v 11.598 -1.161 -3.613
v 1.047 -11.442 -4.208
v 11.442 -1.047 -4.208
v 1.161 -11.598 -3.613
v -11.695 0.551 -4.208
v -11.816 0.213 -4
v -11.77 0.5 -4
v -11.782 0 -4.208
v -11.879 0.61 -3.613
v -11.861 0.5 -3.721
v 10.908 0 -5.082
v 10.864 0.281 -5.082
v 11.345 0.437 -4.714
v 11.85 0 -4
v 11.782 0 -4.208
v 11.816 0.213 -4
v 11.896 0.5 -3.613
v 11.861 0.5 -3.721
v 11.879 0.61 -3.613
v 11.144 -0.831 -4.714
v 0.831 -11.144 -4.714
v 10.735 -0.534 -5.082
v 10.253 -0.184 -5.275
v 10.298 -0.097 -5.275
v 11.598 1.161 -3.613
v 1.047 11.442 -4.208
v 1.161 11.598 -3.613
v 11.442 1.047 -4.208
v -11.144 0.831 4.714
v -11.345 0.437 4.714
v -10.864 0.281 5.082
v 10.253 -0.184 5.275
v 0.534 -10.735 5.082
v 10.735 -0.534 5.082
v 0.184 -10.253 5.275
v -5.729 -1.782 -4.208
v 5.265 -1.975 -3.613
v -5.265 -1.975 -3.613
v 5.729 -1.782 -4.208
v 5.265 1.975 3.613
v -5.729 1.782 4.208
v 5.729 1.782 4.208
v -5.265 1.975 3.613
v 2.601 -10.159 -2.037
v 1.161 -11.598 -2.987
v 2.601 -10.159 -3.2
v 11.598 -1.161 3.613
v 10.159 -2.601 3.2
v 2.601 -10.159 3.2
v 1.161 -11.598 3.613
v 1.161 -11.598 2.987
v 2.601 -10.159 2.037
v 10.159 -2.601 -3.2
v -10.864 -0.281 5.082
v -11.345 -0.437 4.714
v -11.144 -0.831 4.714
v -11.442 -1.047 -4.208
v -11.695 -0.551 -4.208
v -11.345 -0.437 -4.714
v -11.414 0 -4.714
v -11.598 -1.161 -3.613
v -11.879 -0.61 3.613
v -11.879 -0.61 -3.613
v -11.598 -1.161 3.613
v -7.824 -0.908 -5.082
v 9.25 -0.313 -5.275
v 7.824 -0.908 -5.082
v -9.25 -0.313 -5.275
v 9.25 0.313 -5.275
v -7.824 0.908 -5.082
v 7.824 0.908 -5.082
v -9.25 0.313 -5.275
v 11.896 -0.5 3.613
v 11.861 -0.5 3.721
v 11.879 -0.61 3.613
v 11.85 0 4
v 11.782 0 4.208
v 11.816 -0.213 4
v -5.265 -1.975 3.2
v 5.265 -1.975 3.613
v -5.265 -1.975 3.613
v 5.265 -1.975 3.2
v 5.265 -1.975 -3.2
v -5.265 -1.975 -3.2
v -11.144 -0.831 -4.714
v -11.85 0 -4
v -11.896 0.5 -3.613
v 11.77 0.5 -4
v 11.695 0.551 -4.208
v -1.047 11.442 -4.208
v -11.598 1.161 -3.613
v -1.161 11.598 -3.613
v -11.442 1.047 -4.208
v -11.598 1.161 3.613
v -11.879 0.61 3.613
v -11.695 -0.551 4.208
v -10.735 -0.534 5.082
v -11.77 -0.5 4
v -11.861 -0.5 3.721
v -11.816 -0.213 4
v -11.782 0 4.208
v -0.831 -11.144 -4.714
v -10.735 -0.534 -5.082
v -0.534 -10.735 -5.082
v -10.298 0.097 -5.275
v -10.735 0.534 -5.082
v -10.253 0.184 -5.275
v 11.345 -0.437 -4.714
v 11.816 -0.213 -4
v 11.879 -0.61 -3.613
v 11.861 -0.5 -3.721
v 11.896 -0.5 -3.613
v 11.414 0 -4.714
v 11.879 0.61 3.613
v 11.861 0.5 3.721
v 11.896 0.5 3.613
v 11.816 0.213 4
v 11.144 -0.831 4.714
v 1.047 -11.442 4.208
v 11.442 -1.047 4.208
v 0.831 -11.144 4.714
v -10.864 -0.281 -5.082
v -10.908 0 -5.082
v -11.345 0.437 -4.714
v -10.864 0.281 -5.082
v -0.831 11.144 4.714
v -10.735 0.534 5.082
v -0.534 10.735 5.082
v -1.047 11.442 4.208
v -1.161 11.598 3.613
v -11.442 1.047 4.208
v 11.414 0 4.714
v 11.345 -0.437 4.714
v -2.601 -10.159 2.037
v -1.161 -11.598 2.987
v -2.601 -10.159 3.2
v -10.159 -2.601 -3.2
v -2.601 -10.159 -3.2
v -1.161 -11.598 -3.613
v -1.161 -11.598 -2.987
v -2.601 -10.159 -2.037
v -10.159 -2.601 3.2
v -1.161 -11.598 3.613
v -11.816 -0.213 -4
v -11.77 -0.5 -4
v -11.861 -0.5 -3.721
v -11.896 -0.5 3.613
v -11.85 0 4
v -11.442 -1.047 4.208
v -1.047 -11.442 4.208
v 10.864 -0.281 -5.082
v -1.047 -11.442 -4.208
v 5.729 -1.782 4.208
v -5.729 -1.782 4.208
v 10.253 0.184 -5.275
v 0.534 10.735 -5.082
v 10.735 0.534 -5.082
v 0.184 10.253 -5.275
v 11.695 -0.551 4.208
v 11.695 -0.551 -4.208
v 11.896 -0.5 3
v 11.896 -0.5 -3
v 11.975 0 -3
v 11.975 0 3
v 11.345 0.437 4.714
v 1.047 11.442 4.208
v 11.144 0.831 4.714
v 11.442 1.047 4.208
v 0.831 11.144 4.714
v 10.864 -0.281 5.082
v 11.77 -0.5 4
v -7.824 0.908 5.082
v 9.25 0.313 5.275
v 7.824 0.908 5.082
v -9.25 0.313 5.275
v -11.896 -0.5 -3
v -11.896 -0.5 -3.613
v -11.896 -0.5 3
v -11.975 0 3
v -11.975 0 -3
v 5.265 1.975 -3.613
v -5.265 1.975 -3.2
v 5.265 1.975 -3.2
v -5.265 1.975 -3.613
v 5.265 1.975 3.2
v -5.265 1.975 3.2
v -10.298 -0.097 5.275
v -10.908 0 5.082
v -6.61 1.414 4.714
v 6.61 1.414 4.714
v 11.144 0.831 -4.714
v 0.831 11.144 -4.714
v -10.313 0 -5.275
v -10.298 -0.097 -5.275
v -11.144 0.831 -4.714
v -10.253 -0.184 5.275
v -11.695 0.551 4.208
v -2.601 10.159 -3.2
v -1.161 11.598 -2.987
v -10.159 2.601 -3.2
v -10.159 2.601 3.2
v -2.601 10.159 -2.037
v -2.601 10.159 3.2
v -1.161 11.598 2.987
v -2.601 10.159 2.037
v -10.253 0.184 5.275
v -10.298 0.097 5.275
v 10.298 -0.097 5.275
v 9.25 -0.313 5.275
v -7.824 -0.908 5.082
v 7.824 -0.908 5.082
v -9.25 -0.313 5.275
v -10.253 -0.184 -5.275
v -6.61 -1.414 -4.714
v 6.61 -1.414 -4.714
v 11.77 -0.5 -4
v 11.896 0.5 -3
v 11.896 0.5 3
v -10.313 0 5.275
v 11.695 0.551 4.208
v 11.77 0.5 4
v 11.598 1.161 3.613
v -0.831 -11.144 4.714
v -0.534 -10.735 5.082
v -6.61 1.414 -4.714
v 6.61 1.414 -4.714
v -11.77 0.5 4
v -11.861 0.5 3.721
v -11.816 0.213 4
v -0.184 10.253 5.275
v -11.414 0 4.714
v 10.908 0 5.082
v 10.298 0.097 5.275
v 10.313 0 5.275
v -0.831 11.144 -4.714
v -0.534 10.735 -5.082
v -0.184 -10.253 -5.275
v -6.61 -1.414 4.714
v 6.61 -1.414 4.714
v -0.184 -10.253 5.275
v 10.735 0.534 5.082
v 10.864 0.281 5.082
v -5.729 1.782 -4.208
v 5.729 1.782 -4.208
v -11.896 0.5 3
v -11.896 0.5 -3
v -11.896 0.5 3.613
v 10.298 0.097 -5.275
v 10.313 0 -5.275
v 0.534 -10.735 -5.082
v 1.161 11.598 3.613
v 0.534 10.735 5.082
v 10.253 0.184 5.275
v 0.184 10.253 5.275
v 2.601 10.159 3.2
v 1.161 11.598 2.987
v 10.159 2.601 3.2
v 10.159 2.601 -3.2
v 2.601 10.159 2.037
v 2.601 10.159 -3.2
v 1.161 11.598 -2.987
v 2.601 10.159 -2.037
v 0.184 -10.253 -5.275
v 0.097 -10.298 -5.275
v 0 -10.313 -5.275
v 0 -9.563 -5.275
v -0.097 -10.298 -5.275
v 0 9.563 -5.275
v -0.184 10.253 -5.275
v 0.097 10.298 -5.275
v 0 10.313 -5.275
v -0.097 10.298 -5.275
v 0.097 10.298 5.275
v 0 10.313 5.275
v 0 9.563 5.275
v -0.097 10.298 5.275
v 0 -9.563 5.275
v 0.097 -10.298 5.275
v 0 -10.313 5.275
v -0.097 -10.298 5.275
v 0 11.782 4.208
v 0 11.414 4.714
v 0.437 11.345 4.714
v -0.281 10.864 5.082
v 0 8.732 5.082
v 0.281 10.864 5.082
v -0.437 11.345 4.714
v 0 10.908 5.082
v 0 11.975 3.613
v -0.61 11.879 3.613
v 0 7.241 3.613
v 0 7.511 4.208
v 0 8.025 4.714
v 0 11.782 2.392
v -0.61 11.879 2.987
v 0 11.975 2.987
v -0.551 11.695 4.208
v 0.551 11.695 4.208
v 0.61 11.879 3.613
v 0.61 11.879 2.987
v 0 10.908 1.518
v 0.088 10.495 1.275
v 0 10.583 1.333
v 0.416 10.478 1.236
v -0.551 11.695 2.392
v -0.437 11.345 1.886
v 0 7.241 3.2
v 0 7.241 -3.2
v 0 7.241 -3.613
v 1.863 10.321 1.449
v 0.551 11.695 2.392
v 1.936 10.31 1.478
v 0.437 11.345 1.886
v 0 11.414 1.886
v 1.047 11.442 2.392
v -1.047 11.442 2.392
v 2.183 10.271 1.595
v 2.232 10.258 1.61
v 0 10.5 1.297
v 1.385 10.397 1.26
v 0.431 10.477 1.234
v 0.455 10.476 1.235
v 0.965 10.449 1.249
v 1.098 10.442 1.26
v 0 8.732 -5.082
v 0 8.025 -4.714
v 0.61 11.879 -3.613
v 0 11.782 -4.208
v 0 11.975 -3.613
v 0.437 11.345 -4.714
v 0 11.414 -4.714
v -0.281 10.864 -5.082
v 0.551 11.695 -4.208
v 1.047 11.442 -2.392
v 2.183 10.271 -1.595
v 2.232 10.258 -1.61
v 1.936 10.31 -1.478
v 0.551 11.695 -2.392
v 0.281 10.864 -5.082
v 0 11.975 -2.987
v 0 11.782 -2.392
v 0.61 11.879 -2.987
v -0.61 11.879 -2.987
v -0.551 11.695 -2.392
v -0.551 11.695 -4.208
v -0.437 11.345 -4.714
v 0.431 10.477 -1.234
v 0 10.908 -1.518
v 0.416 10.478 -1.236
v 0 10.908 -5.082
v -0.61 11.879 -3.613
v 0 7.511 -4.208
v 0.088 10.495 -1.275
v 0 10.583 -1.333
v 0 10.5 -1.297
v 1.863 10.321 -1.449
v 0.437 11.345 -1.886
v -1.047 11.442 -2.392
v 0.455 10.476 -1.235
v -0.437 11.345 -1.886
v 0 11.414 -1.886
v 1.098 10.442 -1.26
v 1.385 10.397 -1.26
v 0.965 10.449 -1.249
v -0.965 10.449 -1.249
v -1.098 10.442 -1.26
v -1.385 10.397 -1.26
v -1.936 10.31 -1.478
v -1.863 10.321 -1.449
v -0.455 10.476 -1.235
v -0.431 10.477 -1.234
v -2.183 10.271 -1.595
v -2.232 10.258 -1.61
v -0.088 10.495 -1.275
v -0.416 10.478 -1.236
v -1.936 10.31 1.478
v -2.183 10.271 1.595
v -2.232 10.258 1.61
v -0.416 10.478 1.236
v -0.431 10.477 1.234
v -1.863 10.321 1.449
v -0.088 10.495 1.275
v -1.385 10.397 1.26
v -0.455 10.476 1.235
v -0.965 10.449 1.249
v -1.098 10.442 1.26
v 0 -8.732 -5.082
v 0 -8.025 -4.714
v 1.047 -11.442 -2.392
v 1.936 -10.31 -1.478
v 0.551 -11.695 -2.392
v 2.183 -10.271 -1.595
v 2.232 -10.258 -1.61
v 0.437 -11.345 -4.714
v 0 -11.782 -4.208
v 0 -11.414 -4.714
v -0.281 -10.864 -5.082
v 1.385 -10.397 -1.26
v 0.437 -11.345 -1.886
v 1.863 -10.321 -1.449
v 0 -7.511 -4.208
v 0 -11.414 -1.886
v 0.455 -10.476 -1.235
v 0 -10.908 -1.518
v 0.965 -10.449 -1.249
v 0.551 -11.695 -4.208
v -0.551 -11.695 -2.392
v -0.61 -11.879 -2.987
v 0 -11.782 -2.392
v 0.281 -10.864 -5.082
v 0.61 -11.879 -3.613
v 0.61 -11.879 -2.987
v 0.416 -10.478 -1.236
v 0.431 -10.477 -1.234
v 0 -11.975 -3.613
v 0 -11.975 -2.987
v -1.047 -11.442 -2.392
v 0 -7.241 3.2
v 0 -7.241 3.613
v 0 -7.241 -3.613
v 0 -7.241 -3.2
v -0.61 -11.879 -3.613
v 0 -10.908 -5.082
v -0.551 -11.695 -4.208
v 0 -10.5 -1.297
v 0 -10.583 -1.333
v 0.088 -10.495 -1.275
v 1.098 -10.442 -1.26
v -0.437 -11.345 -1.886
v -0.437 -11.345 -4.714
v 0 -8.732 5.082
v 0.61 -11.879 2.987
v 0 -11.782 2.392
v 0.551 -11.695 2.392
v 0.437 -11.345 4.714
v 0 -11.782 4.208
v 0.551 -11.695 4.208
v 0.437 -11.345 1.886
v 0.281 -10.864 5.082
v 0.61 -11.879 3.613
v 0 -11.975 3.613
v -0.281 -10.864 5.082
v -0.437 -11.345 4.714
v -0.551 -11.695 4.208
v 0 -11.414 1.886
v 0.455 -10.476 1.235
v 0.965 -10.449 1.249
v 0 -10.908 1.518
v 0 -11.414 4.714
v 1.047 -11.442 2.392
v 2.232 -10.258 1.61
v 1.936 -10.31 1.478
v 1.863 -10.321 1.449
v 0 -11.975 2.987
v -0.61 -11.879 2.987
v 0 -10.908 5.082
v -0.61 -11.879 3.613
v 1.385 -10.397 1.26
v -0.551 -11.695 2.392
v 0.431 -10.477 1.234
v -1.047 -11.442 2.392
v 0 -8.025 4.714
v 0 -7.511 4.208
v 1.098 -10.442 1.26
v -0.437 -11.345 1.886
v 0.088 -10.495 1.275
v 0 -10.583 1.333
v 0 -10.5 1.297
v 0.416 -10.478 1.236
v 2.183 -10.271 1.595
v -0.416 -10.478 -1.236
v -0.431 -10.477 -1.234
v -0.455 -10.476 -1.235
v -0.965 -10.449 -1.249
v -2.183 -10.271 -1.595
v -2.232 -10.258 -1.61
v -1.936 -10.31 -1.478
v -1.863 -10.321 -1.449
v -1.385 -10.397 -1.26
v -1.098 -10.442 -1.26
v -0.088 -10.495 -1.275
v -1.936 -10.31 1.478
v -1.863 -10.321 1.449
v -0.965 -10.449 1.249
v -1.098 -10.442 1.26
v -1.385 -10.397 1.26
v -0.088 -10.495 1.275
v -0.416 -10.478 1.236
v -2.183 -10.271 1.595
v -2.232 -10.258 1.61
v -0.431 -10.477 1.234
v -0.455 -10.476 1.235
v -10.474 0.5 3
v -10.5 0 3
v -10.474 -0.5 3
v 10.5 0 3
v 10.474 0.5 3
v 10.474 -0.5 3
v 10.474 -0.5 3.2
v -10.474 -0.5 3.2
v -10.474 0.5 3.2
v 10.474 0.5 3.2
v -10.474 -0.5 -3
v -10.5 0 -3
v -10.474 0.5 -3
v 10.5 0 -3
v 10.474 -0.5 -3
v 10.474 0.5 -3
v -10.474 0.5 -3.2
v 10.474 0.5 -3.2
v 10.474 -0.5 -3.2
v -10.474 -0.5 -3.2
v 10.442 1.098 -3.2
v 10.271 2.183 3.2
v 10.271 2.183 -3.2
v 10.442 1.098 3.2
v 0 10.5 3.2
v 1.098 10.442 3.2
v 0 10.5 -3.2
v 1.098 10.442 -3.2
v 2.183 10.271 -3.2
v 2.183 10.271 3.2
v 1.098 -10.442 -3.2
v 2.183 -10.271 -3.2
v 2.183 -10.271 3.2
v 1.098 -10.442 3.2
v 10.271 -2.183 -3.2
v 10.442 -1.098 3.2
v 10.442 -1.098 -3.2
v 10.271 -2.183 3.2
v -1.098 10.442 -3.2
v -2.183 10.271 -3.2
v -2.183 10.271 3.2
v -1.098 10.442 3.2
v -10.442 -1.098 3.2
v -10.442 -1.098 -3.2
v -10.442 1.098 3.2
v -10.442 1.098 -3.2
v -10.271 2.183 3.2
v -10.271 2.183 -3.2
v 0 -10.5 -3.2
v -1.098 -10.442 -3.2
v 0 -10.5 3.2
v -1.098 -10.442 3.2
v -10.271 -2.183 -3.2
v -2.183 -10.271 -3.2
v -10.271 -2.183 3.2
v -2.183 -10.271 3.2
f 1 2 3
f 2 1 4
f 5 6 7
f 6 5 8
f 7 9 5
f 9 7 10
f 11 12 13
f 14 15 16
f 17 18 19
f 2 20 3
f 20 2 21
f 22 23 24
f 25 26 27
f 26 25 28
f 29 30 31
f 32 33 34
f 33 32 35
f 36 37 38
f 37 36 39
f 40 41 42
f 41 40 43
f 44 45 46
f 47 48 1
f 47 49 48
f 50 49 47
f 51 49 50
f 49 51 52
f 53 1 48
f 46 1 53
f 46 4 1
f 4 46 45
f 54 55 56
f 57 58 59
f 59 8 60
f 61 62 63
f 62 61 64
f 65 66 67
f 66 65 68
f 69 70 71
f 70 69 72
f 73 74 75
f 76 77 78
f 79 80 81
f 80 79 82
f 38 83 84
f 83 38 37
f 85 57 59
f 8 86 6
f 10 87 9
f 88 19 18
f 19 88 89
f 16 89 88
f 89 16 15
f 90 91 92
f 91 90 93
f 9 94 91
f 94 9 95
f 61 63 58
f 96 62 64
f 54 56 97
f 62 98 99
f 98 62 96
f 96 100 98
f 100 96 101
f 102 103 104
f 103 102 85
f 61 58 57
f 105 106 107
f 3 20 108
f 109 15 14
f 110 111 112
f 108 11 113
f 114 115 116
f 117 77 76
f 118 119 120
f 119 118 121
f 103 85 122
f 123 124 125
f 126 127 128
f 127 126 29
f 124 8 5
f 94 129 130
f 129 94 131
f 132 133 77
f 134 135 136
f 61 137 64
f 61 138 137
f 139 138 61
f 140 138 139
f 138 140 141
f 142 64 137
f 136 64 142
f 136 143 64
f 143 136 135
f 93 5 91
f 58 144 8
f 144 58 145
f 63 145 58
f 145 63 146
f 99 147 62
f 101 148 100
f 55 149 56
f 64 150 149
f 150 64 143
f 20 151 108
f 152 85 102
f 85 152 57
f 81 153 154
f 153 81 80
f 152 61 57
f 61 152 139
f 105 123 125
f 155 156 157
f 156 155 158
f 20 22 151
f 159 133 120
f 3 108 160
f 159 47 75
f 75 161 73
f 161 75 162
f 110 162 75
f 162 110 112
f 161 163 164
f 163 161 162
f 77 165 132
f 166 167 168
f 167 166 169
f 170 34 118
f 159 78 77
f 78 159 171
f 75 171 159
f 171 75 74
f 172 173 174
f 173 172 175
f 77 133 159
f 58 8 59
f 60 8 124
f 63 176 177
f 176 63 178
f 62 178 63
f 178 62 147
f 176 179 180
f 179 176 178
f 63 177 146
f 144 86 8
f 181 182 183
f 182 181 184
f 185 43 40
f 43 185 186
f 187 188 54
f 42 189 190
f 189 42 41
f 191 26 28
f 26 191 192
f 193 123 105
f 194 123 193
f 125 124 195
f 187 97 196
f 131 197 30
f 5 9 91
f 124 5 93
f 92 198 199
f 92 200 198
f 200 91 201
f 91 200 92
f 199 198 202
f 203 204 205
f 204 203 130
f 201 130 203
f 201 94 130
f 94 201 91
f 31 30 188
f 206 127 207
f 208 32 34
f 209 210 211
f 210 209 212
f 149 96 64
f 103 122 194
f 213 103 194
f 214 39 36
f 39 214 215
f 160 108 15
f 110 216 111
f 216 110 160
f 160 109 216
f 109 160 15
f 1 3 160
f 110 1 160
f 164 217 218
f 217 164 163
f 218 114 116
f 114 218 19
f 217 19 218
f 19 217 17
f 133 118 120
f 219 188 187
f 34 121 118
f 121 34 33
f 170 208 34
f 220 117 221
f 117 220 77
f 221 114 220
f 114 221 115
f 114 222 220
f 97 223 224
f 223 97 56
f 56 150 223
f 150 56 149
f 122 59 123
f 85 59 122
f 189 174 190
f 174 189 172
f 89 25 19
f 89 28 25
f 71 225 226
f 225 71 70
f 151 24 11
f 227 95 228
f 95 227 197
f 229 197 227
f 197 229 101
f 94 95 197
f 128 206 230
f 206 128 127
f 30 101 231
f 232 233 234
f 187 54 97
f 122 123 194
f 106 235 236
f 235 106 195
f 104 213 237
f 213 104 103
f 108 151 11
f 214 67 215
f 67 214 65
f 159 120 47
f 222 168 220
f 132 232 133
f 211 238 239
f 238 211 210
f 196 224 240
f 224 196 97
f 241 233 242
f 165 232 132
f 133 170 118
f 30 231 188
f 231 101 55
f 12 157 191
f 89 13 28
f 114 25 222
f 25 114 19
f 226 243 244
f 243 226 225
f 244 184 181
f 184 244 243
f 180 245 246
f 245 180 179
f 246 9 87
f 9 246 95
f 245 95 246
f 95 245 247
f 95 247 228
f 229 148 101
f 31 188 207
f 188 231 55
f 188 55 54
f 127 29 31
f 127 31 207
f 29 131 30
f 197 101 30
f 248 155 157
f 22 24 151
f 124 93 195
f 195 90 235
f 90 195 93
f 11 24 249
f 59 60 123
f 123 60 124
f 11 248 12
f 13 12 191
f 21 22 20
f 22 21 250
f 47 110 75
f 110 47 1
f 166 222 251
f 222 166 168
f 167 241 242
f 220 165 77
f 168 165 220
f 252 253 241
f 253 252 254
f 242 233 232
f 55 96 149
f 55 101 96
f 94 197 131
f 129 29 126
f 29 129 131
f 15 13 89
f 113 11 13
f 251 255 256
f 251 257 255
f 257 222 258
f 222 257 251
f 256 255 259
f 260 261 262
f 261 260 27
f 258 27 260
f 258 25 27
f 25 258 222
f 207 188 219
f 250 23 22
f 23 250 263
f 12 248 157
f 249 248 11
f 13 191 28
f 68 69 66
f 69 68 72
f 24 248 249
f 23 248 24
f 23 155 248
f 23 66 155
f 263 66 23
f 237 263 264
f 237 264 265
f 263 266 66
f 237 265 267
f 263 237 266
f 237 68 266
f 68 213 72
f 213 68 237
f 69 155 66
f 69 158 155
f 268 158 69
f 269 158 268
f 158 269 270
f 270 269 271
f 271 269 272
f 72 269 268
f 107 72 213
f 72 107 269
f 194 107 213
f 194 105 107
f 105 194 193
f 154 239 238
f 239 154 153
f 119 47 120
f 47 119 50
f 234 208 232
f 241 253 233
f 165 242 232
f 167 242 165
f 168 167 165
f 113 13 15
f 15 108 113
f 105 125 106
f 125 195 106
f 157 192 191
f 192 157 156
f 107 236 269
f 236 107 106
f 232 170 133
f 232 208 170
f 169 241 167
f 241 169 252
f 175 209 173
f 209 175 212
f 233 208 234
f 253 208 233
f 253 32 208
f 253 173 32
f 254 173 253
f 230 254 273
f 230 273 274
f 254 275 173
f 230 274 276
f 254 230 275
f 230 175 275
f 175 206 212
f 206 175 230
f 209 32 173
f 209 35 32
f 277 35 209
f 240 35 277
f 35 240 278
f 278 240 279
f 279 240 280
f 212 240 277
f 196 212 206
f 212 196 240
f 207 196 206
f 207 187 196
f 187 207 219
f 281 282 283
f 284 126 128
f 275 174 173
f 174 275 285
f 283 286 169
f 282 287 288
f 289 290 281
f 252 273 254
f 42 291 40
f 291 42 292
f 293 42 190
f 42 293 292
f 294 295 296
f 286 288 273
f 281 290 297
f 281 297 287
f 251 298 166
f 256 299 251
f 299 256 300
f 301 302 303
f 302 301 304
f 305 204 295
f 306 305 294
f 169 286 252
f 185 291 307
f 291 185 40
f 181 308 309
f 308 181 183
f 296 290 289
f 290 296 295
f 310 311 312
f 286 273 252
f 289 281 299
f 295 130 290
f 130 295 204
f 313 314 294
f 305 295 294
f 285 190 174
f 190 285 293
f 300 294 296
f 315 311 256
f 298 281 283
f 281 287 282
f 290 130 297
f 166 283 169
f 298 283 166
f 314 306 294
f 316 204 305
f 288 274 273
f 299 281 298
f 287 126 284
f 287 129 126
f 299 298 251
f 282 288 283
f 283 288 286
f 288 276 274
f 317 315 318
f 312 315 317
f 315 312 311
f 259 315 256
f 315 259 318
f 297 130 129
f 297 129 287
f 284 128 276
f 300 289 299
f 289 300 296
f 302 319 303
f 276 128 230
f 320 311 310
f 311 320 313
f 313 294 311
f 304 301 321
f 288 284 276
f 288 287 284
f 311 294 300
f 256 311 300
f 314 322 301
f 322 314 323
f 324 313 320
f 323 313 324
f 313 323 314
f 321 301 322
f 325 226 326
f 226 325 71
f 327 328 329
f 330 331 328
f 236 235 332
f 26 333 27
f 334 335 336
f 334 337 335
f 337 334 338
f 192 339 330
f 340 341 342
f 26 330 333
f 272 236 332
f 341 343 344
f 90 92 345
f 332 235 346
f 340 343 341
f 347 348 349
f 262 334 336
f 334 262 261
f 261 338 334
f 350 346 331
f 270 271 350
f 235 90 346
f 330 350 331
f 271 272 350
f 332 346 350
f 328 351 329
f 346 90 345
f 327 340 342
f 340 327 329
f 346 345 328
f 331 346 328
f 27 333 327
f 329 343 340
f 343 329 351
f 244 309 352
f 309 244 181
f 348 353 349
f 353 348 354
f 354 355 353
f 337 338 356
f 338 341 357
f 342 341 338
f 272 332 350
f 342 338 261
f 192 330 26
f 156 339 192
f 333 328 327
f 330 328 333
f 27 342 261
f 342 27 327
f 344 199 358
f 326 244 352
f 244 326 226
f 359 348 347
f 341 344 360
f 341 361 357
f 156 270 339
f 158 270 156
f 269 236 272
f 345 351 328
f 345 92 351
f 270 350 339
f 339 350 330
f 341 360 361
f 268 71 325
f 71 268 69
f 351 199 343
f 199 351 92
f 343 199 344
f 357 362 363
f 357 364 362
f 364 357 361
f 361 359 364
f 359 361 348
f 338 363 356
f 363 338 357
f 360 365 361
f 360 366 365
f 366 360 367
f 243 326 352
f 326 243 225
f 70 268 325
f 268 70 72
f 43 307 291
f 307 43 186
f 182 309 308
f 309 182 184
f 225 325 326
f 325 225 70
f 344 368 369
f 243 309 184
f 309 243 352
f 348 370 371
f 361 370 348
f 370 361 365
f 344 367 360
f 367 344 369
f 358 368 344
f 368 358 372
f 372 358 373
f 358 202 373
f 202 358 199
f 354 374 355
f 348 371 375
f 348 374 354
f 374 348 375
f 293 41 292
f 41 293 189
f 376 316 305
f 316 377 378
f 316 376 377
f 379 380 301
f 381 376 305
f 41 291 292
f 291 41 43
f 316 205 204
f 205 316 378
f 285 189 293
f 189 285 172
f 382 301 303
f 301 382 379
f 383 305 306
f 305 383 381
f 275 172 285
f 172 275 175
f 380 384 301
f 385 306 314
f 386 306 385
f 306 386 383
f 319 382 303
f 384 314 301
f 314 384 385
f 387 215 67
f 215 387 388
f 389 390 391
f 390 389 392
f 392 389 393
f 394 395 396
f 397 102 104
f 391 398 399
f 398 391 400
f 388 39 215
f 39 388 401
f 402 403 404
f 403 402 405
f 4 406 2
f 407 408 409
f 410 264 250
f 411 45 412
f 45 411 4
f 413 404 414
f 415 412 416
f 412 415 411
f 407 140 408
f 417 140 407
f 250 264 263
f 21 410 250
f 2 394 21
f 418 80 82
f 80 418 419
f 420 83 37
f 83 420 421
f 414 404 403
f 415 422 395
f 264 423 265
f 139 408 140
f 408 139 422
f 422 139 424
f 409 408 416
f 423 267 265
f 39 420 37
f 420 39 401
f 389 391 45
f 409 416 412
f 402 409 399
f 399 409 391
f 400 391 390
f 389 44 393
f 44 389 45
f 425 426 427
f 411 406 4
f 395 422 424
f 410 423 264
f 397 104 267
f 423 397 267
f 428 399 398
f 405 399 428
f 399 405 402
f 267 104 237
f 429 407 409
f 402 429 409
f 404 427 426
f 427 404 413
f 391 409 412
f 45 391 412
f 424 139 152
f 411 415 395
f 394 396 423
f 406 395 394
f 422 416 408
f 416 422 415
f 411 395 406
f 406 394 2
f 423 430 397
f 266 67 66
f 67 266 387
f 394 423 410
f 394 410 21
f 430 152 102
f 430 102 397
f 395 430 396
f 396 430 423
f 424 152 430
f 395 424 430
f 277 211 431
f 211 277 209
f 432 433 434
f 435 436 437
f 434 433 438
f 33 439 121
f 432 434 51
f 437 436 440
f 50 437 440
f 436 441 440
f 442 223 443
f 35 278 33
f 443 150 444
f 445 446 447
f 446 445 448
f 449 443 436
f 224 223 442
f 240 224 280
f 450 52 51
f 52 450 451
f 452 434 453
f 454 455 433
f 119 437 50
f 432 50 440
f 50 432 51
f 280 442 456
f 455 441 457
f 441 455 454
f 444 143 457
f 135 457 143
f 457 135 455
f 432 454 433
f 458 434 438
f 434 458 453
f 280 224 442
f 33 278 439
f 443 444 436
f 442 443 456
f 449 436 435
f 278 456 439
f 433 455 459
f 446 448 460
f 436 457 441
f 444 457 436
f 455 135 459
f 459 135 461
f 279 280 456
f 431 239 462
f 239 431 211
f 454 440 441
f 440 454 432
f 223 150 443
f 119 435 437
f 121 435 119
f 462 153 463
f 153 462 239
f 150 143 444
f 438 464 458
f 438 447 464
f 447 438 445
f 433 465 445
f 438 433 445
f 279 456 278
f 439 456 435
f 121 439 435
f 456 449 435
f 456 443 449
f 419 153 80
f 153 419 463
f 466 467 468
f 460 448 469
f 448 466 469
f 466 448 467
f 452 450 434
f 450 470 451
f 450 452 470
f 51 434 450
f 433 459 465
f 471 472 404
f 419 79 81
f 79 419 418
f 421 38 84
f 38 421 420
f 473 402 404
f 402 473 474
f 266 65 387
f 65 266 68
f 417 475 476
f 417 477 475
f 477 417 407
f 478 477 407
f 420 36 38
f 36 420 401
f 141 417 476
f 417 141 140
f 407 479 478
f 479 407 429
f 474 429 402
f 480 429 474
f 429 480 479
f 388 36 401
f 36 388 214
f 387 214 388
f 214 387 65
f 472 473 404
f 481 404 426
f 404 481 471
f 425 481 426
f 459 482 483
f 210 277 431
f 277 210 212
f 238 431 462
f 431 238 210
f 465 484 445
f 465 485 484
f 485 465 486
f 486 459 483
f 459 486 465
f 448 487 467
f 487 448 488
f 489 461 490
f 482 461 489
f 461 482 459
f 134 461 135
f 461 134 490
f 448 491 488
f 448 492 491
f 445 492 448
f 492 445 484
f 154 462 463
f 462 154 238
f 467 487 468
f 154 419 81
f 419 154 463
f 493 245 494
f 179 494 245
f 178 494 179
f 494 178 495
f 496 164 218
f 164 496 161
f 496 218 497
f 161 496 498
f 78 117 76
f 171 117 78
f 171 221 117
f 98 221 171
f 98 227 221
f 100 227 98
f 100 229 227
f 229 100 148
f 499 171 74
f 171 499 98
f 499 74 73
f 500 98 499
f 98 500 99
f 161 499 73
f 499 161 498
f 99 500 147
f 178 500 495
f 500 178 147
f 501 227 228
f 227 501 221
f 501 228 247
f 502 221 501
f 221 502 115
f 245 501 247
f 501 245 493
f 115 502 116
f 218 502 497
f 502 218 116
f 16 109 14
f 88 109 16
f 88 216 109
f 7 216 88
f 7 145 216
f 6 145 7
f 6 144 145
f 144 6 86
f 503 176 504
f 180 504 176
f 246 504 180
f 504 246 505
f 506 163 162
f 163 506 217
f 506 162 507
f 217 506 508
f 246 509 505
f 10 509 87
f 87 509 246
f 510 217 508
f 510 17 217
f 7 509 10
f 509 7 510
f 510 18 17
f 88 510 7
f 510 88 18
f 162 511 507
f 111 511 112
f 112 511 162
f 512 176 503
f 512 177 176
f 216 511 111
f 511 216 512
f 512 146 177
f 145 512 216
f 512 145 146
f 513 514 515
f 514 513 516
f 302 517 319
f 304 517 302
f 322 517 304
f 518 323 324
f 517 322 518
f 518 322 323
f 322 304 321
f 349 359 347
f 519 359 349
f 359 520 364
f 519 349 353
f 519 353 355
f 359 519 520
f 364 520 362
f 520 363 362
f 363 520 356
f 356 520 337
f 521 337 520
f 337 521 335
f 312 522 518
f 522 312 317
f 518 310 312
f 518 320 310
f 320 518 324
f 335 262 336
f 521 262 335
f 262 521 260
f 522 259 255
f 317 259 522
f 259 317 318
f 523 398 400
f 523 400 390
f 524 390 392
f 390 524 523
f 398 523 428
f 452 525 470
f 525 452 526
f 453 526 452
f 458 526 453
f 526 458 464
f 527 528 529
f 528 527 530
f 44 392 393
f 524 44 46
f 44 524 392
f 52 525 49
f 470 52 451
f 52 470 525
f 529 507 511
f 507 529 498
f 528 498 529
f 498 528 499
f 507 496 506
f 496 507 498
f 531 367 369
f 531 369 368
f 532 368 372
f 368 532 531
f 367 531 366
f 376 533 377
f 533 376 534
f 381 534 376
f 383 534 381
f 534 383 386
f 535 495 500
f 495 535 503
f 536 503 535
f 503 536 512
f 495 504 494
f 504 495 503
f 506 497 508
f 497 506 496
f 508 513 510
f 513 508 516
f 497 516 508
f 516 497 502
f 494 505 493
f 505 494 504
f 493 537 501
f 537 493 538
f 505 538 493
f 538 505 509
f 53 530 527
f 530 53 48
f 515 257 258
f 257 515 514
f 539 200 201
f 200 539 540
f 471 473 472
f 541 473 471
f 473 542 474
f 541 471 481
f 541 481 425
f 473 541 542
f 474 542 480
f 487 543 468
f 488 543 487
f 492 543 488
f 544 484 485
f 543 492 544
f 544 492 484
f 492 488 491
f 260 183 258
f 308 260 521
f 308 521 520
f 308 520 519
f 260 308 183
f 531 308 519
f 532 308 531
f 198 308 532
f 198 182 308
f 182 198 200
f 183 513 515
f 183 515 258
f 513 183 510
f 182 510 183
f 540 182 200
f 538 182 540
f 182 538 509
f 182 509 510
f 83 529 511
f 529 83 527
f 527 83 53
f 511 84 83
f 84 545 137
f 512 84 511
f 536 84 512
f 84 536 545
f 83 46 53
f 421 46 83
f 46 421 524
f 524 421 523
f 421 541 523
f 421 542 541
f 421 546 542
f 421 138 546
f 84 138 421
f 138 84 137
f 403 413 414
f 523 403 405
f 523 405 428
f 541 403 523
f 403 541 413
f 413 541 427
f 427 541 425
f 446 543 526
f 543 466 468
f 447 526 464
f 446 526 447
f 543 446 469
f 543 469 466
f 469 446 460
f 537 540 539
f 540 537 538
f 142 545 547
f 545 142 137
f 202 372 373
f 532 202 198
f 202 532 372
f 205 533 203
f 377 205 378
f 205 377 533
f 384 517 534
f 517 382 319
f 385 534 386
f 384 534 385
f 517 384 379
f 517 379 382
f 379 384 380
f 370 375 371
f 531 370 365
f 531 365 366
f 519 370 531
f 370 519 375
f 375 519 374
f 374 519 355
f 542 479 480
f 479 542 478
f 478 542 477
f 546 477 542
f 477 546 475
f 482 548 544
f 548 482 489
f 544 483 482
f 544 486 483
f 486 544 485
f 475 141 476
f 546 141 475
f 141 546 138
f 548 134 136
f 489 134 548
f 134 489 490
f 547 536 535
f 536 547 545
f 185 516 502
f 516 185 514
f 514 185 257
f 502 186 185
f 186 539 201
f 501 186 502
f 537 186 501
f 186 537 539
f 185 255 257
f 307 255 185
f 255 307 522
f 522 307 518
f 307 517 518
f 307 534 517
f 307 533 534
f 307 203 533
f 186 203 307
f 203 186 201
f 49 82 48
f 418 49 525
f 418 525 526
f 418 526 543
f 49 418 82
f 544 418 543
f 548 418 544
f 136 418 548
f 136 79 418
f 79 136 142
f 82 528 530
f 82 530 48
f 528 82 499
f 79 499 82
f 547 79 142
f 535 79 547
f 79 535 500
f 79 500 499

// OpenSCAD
//mirror();
battery();

module battery() {
    difference() {
        union() {
            //cylinder(d=31+1,h=6.4+1,$fn=60,center=true);
            //translate([18,0,0]) sphere(d=5,h=5,$fn=20,center=true);
            i=4;
            hull() {
                translate([10,0,3.3]) sphere(d=i,$fn=20,center=true);
                translate([10,0,-3.3]) sphere(d=i,$fn=20,center=true);
                translate([-10,0,3.3]) sphere(d=i,$fn=20,center=true);
                translate([-10,0,-3.3]) sphere(d=i,$fn=20,center=true);
            }
            
            hull() {
                translate([10,0,3.3]) sphere(d=i,$fn=20,center=true);
                translate([10,0,-3.3]) sphere(d=i,$fn=20,center=true);
                translate([0,10,3.3]) sphere(d=i,$fn=20,center=true);
            }
            hull() {
                translate([10,0,3.3]) sphere(d=i,$fn=20,center=true);
                translate([10,0,-3.3]) sphere(d=i,$fn=20,center=true);
                translate([0,10,-3.3]) sphere(d=i,$fn=20,center=true);
            }
            hull() {
                translate([0,10,-3.3]) sphere(d=i,$fn=20,center=true);
                translate([-10,0,3.3]) sphere(d=i,$fn=20,center=true);
                translate([-10,0,-3.3]) sphere(d=i,$fn=20,center=true);
            }
            hull() {
                translate([0,10,3.3]) sphere(d=i,$fn=20,center=true);
                translate([-10,0,3.3]) sphere(d=i,$fn=20,center=true);
                translate([-10,0,-3.3]) sphere(d=i,$fn=20,center=true);
            }
            hull() {
                translate([10,0,3.3]) sphere(d=i,$fn=20,center=true);
                translate([10,0,-3.3]) sphere(d=i,$fn=20,center=true);
                translate([0,-10,-3.3]) sphere(d=i,$fn=20,center=true);
            }
            hull() {
                translate([10,0,3.3]) sphere(d=i,$fn=20,center=true);
                translate([10,0,-3.3]) sphere(d=i,$fn=20,center=true);
                translate([0,-10,3.3]) sphere(d=i,$fn=20,center=true);
            }
            hull() {
                translate([-10,0,3.3]) sphere(d=i,$fn=20,center=true);
                translate([-10,0,-3.3]) sphere(d=i,$fn=20,center=true);
                translate([0,-10,-3.3]) sphere(d=i,$fn=20,center=true);
            }
            hull() {
                translate([-10,0,3.3]) sphere(d=i,$fn=20,center=true);
                translate([-10,0,-3.3]) sphere(d=i,$fn=20,center=true);
                translate([0,-10,3.3]) sphere(d=i,$fn=20,center=true);
            }
        }
        translate([0,0,3.2+0.3]) rotate([0,90,0]) cube([1,1,100], center=true);
        translate([0,0,-3.2-0.3]) rotate([0,90,0]) cube([1,1,100], center=true);
        
        translate([16.5,0,0]) rotate([0,90,90]) cube([1,1,100], center=true);
        
        cylinder(d=21,h=6.4,$fn=60, center=true);
        //translate([0,32/4,0]) cube([31+1,(31+1)/2,6.4],center=true);
    }
}

//translate([0,0,30]) sphere(d=4,center=true, $fn=20);
module mirror() {
    difference() {
    rotate([45,-atan(sqrt(0.5)),-30])
    difference() {
        hull() {
            translate([15,15,15]) sphere(d=6, center=true, $fn=20);
            translate([15,-15,15]) sphere(d=6, center=true, $fn=20);
            translate([15,15,-15]) sphere(d=6, center=true, $fn=20);
            translate([15,-15,-15]) sphere(d=6, center=true, $fn=20);
            translate([-15,15,15]) sphere(d=6, center=true, $fn=20);
            translate([-15,-15,15]) sphere(d=6, center=true, $fn=20);
            translate([-15,15,-15]) sphere(d=6, center=true, $fn=20);
            translate([-15,-15,-15]) sphere(d=6, center=true, $fn=20);
        }
        union() {
            cube([24,36,24],center=true);
            cube([36,24,24],center=true);
            cube([24,24,36],center=true);
       
            translate([0,0,16.5]) cube([27,27,3],center=true);
            translate([0,0,-16.5]) cube([27,27,3],center=true);
            translate([0,16.5,0]) cube([27,3,27],center=true);
            translate([0,-16.5,0]) cube([27,3,27],center=true);
            translate([16.5,0,0]) cube([3,27,27],center=true);
            translate([-16.5,0,0]) cube([3,27,27],center=true);
        }
        
    }
    translate([0,0,60]) cylinder(d=5, h=100,center=true, $fn=20);
    //translate([0,0,23]) sphere(d=5, center=true, $fn=20);
    }
}
